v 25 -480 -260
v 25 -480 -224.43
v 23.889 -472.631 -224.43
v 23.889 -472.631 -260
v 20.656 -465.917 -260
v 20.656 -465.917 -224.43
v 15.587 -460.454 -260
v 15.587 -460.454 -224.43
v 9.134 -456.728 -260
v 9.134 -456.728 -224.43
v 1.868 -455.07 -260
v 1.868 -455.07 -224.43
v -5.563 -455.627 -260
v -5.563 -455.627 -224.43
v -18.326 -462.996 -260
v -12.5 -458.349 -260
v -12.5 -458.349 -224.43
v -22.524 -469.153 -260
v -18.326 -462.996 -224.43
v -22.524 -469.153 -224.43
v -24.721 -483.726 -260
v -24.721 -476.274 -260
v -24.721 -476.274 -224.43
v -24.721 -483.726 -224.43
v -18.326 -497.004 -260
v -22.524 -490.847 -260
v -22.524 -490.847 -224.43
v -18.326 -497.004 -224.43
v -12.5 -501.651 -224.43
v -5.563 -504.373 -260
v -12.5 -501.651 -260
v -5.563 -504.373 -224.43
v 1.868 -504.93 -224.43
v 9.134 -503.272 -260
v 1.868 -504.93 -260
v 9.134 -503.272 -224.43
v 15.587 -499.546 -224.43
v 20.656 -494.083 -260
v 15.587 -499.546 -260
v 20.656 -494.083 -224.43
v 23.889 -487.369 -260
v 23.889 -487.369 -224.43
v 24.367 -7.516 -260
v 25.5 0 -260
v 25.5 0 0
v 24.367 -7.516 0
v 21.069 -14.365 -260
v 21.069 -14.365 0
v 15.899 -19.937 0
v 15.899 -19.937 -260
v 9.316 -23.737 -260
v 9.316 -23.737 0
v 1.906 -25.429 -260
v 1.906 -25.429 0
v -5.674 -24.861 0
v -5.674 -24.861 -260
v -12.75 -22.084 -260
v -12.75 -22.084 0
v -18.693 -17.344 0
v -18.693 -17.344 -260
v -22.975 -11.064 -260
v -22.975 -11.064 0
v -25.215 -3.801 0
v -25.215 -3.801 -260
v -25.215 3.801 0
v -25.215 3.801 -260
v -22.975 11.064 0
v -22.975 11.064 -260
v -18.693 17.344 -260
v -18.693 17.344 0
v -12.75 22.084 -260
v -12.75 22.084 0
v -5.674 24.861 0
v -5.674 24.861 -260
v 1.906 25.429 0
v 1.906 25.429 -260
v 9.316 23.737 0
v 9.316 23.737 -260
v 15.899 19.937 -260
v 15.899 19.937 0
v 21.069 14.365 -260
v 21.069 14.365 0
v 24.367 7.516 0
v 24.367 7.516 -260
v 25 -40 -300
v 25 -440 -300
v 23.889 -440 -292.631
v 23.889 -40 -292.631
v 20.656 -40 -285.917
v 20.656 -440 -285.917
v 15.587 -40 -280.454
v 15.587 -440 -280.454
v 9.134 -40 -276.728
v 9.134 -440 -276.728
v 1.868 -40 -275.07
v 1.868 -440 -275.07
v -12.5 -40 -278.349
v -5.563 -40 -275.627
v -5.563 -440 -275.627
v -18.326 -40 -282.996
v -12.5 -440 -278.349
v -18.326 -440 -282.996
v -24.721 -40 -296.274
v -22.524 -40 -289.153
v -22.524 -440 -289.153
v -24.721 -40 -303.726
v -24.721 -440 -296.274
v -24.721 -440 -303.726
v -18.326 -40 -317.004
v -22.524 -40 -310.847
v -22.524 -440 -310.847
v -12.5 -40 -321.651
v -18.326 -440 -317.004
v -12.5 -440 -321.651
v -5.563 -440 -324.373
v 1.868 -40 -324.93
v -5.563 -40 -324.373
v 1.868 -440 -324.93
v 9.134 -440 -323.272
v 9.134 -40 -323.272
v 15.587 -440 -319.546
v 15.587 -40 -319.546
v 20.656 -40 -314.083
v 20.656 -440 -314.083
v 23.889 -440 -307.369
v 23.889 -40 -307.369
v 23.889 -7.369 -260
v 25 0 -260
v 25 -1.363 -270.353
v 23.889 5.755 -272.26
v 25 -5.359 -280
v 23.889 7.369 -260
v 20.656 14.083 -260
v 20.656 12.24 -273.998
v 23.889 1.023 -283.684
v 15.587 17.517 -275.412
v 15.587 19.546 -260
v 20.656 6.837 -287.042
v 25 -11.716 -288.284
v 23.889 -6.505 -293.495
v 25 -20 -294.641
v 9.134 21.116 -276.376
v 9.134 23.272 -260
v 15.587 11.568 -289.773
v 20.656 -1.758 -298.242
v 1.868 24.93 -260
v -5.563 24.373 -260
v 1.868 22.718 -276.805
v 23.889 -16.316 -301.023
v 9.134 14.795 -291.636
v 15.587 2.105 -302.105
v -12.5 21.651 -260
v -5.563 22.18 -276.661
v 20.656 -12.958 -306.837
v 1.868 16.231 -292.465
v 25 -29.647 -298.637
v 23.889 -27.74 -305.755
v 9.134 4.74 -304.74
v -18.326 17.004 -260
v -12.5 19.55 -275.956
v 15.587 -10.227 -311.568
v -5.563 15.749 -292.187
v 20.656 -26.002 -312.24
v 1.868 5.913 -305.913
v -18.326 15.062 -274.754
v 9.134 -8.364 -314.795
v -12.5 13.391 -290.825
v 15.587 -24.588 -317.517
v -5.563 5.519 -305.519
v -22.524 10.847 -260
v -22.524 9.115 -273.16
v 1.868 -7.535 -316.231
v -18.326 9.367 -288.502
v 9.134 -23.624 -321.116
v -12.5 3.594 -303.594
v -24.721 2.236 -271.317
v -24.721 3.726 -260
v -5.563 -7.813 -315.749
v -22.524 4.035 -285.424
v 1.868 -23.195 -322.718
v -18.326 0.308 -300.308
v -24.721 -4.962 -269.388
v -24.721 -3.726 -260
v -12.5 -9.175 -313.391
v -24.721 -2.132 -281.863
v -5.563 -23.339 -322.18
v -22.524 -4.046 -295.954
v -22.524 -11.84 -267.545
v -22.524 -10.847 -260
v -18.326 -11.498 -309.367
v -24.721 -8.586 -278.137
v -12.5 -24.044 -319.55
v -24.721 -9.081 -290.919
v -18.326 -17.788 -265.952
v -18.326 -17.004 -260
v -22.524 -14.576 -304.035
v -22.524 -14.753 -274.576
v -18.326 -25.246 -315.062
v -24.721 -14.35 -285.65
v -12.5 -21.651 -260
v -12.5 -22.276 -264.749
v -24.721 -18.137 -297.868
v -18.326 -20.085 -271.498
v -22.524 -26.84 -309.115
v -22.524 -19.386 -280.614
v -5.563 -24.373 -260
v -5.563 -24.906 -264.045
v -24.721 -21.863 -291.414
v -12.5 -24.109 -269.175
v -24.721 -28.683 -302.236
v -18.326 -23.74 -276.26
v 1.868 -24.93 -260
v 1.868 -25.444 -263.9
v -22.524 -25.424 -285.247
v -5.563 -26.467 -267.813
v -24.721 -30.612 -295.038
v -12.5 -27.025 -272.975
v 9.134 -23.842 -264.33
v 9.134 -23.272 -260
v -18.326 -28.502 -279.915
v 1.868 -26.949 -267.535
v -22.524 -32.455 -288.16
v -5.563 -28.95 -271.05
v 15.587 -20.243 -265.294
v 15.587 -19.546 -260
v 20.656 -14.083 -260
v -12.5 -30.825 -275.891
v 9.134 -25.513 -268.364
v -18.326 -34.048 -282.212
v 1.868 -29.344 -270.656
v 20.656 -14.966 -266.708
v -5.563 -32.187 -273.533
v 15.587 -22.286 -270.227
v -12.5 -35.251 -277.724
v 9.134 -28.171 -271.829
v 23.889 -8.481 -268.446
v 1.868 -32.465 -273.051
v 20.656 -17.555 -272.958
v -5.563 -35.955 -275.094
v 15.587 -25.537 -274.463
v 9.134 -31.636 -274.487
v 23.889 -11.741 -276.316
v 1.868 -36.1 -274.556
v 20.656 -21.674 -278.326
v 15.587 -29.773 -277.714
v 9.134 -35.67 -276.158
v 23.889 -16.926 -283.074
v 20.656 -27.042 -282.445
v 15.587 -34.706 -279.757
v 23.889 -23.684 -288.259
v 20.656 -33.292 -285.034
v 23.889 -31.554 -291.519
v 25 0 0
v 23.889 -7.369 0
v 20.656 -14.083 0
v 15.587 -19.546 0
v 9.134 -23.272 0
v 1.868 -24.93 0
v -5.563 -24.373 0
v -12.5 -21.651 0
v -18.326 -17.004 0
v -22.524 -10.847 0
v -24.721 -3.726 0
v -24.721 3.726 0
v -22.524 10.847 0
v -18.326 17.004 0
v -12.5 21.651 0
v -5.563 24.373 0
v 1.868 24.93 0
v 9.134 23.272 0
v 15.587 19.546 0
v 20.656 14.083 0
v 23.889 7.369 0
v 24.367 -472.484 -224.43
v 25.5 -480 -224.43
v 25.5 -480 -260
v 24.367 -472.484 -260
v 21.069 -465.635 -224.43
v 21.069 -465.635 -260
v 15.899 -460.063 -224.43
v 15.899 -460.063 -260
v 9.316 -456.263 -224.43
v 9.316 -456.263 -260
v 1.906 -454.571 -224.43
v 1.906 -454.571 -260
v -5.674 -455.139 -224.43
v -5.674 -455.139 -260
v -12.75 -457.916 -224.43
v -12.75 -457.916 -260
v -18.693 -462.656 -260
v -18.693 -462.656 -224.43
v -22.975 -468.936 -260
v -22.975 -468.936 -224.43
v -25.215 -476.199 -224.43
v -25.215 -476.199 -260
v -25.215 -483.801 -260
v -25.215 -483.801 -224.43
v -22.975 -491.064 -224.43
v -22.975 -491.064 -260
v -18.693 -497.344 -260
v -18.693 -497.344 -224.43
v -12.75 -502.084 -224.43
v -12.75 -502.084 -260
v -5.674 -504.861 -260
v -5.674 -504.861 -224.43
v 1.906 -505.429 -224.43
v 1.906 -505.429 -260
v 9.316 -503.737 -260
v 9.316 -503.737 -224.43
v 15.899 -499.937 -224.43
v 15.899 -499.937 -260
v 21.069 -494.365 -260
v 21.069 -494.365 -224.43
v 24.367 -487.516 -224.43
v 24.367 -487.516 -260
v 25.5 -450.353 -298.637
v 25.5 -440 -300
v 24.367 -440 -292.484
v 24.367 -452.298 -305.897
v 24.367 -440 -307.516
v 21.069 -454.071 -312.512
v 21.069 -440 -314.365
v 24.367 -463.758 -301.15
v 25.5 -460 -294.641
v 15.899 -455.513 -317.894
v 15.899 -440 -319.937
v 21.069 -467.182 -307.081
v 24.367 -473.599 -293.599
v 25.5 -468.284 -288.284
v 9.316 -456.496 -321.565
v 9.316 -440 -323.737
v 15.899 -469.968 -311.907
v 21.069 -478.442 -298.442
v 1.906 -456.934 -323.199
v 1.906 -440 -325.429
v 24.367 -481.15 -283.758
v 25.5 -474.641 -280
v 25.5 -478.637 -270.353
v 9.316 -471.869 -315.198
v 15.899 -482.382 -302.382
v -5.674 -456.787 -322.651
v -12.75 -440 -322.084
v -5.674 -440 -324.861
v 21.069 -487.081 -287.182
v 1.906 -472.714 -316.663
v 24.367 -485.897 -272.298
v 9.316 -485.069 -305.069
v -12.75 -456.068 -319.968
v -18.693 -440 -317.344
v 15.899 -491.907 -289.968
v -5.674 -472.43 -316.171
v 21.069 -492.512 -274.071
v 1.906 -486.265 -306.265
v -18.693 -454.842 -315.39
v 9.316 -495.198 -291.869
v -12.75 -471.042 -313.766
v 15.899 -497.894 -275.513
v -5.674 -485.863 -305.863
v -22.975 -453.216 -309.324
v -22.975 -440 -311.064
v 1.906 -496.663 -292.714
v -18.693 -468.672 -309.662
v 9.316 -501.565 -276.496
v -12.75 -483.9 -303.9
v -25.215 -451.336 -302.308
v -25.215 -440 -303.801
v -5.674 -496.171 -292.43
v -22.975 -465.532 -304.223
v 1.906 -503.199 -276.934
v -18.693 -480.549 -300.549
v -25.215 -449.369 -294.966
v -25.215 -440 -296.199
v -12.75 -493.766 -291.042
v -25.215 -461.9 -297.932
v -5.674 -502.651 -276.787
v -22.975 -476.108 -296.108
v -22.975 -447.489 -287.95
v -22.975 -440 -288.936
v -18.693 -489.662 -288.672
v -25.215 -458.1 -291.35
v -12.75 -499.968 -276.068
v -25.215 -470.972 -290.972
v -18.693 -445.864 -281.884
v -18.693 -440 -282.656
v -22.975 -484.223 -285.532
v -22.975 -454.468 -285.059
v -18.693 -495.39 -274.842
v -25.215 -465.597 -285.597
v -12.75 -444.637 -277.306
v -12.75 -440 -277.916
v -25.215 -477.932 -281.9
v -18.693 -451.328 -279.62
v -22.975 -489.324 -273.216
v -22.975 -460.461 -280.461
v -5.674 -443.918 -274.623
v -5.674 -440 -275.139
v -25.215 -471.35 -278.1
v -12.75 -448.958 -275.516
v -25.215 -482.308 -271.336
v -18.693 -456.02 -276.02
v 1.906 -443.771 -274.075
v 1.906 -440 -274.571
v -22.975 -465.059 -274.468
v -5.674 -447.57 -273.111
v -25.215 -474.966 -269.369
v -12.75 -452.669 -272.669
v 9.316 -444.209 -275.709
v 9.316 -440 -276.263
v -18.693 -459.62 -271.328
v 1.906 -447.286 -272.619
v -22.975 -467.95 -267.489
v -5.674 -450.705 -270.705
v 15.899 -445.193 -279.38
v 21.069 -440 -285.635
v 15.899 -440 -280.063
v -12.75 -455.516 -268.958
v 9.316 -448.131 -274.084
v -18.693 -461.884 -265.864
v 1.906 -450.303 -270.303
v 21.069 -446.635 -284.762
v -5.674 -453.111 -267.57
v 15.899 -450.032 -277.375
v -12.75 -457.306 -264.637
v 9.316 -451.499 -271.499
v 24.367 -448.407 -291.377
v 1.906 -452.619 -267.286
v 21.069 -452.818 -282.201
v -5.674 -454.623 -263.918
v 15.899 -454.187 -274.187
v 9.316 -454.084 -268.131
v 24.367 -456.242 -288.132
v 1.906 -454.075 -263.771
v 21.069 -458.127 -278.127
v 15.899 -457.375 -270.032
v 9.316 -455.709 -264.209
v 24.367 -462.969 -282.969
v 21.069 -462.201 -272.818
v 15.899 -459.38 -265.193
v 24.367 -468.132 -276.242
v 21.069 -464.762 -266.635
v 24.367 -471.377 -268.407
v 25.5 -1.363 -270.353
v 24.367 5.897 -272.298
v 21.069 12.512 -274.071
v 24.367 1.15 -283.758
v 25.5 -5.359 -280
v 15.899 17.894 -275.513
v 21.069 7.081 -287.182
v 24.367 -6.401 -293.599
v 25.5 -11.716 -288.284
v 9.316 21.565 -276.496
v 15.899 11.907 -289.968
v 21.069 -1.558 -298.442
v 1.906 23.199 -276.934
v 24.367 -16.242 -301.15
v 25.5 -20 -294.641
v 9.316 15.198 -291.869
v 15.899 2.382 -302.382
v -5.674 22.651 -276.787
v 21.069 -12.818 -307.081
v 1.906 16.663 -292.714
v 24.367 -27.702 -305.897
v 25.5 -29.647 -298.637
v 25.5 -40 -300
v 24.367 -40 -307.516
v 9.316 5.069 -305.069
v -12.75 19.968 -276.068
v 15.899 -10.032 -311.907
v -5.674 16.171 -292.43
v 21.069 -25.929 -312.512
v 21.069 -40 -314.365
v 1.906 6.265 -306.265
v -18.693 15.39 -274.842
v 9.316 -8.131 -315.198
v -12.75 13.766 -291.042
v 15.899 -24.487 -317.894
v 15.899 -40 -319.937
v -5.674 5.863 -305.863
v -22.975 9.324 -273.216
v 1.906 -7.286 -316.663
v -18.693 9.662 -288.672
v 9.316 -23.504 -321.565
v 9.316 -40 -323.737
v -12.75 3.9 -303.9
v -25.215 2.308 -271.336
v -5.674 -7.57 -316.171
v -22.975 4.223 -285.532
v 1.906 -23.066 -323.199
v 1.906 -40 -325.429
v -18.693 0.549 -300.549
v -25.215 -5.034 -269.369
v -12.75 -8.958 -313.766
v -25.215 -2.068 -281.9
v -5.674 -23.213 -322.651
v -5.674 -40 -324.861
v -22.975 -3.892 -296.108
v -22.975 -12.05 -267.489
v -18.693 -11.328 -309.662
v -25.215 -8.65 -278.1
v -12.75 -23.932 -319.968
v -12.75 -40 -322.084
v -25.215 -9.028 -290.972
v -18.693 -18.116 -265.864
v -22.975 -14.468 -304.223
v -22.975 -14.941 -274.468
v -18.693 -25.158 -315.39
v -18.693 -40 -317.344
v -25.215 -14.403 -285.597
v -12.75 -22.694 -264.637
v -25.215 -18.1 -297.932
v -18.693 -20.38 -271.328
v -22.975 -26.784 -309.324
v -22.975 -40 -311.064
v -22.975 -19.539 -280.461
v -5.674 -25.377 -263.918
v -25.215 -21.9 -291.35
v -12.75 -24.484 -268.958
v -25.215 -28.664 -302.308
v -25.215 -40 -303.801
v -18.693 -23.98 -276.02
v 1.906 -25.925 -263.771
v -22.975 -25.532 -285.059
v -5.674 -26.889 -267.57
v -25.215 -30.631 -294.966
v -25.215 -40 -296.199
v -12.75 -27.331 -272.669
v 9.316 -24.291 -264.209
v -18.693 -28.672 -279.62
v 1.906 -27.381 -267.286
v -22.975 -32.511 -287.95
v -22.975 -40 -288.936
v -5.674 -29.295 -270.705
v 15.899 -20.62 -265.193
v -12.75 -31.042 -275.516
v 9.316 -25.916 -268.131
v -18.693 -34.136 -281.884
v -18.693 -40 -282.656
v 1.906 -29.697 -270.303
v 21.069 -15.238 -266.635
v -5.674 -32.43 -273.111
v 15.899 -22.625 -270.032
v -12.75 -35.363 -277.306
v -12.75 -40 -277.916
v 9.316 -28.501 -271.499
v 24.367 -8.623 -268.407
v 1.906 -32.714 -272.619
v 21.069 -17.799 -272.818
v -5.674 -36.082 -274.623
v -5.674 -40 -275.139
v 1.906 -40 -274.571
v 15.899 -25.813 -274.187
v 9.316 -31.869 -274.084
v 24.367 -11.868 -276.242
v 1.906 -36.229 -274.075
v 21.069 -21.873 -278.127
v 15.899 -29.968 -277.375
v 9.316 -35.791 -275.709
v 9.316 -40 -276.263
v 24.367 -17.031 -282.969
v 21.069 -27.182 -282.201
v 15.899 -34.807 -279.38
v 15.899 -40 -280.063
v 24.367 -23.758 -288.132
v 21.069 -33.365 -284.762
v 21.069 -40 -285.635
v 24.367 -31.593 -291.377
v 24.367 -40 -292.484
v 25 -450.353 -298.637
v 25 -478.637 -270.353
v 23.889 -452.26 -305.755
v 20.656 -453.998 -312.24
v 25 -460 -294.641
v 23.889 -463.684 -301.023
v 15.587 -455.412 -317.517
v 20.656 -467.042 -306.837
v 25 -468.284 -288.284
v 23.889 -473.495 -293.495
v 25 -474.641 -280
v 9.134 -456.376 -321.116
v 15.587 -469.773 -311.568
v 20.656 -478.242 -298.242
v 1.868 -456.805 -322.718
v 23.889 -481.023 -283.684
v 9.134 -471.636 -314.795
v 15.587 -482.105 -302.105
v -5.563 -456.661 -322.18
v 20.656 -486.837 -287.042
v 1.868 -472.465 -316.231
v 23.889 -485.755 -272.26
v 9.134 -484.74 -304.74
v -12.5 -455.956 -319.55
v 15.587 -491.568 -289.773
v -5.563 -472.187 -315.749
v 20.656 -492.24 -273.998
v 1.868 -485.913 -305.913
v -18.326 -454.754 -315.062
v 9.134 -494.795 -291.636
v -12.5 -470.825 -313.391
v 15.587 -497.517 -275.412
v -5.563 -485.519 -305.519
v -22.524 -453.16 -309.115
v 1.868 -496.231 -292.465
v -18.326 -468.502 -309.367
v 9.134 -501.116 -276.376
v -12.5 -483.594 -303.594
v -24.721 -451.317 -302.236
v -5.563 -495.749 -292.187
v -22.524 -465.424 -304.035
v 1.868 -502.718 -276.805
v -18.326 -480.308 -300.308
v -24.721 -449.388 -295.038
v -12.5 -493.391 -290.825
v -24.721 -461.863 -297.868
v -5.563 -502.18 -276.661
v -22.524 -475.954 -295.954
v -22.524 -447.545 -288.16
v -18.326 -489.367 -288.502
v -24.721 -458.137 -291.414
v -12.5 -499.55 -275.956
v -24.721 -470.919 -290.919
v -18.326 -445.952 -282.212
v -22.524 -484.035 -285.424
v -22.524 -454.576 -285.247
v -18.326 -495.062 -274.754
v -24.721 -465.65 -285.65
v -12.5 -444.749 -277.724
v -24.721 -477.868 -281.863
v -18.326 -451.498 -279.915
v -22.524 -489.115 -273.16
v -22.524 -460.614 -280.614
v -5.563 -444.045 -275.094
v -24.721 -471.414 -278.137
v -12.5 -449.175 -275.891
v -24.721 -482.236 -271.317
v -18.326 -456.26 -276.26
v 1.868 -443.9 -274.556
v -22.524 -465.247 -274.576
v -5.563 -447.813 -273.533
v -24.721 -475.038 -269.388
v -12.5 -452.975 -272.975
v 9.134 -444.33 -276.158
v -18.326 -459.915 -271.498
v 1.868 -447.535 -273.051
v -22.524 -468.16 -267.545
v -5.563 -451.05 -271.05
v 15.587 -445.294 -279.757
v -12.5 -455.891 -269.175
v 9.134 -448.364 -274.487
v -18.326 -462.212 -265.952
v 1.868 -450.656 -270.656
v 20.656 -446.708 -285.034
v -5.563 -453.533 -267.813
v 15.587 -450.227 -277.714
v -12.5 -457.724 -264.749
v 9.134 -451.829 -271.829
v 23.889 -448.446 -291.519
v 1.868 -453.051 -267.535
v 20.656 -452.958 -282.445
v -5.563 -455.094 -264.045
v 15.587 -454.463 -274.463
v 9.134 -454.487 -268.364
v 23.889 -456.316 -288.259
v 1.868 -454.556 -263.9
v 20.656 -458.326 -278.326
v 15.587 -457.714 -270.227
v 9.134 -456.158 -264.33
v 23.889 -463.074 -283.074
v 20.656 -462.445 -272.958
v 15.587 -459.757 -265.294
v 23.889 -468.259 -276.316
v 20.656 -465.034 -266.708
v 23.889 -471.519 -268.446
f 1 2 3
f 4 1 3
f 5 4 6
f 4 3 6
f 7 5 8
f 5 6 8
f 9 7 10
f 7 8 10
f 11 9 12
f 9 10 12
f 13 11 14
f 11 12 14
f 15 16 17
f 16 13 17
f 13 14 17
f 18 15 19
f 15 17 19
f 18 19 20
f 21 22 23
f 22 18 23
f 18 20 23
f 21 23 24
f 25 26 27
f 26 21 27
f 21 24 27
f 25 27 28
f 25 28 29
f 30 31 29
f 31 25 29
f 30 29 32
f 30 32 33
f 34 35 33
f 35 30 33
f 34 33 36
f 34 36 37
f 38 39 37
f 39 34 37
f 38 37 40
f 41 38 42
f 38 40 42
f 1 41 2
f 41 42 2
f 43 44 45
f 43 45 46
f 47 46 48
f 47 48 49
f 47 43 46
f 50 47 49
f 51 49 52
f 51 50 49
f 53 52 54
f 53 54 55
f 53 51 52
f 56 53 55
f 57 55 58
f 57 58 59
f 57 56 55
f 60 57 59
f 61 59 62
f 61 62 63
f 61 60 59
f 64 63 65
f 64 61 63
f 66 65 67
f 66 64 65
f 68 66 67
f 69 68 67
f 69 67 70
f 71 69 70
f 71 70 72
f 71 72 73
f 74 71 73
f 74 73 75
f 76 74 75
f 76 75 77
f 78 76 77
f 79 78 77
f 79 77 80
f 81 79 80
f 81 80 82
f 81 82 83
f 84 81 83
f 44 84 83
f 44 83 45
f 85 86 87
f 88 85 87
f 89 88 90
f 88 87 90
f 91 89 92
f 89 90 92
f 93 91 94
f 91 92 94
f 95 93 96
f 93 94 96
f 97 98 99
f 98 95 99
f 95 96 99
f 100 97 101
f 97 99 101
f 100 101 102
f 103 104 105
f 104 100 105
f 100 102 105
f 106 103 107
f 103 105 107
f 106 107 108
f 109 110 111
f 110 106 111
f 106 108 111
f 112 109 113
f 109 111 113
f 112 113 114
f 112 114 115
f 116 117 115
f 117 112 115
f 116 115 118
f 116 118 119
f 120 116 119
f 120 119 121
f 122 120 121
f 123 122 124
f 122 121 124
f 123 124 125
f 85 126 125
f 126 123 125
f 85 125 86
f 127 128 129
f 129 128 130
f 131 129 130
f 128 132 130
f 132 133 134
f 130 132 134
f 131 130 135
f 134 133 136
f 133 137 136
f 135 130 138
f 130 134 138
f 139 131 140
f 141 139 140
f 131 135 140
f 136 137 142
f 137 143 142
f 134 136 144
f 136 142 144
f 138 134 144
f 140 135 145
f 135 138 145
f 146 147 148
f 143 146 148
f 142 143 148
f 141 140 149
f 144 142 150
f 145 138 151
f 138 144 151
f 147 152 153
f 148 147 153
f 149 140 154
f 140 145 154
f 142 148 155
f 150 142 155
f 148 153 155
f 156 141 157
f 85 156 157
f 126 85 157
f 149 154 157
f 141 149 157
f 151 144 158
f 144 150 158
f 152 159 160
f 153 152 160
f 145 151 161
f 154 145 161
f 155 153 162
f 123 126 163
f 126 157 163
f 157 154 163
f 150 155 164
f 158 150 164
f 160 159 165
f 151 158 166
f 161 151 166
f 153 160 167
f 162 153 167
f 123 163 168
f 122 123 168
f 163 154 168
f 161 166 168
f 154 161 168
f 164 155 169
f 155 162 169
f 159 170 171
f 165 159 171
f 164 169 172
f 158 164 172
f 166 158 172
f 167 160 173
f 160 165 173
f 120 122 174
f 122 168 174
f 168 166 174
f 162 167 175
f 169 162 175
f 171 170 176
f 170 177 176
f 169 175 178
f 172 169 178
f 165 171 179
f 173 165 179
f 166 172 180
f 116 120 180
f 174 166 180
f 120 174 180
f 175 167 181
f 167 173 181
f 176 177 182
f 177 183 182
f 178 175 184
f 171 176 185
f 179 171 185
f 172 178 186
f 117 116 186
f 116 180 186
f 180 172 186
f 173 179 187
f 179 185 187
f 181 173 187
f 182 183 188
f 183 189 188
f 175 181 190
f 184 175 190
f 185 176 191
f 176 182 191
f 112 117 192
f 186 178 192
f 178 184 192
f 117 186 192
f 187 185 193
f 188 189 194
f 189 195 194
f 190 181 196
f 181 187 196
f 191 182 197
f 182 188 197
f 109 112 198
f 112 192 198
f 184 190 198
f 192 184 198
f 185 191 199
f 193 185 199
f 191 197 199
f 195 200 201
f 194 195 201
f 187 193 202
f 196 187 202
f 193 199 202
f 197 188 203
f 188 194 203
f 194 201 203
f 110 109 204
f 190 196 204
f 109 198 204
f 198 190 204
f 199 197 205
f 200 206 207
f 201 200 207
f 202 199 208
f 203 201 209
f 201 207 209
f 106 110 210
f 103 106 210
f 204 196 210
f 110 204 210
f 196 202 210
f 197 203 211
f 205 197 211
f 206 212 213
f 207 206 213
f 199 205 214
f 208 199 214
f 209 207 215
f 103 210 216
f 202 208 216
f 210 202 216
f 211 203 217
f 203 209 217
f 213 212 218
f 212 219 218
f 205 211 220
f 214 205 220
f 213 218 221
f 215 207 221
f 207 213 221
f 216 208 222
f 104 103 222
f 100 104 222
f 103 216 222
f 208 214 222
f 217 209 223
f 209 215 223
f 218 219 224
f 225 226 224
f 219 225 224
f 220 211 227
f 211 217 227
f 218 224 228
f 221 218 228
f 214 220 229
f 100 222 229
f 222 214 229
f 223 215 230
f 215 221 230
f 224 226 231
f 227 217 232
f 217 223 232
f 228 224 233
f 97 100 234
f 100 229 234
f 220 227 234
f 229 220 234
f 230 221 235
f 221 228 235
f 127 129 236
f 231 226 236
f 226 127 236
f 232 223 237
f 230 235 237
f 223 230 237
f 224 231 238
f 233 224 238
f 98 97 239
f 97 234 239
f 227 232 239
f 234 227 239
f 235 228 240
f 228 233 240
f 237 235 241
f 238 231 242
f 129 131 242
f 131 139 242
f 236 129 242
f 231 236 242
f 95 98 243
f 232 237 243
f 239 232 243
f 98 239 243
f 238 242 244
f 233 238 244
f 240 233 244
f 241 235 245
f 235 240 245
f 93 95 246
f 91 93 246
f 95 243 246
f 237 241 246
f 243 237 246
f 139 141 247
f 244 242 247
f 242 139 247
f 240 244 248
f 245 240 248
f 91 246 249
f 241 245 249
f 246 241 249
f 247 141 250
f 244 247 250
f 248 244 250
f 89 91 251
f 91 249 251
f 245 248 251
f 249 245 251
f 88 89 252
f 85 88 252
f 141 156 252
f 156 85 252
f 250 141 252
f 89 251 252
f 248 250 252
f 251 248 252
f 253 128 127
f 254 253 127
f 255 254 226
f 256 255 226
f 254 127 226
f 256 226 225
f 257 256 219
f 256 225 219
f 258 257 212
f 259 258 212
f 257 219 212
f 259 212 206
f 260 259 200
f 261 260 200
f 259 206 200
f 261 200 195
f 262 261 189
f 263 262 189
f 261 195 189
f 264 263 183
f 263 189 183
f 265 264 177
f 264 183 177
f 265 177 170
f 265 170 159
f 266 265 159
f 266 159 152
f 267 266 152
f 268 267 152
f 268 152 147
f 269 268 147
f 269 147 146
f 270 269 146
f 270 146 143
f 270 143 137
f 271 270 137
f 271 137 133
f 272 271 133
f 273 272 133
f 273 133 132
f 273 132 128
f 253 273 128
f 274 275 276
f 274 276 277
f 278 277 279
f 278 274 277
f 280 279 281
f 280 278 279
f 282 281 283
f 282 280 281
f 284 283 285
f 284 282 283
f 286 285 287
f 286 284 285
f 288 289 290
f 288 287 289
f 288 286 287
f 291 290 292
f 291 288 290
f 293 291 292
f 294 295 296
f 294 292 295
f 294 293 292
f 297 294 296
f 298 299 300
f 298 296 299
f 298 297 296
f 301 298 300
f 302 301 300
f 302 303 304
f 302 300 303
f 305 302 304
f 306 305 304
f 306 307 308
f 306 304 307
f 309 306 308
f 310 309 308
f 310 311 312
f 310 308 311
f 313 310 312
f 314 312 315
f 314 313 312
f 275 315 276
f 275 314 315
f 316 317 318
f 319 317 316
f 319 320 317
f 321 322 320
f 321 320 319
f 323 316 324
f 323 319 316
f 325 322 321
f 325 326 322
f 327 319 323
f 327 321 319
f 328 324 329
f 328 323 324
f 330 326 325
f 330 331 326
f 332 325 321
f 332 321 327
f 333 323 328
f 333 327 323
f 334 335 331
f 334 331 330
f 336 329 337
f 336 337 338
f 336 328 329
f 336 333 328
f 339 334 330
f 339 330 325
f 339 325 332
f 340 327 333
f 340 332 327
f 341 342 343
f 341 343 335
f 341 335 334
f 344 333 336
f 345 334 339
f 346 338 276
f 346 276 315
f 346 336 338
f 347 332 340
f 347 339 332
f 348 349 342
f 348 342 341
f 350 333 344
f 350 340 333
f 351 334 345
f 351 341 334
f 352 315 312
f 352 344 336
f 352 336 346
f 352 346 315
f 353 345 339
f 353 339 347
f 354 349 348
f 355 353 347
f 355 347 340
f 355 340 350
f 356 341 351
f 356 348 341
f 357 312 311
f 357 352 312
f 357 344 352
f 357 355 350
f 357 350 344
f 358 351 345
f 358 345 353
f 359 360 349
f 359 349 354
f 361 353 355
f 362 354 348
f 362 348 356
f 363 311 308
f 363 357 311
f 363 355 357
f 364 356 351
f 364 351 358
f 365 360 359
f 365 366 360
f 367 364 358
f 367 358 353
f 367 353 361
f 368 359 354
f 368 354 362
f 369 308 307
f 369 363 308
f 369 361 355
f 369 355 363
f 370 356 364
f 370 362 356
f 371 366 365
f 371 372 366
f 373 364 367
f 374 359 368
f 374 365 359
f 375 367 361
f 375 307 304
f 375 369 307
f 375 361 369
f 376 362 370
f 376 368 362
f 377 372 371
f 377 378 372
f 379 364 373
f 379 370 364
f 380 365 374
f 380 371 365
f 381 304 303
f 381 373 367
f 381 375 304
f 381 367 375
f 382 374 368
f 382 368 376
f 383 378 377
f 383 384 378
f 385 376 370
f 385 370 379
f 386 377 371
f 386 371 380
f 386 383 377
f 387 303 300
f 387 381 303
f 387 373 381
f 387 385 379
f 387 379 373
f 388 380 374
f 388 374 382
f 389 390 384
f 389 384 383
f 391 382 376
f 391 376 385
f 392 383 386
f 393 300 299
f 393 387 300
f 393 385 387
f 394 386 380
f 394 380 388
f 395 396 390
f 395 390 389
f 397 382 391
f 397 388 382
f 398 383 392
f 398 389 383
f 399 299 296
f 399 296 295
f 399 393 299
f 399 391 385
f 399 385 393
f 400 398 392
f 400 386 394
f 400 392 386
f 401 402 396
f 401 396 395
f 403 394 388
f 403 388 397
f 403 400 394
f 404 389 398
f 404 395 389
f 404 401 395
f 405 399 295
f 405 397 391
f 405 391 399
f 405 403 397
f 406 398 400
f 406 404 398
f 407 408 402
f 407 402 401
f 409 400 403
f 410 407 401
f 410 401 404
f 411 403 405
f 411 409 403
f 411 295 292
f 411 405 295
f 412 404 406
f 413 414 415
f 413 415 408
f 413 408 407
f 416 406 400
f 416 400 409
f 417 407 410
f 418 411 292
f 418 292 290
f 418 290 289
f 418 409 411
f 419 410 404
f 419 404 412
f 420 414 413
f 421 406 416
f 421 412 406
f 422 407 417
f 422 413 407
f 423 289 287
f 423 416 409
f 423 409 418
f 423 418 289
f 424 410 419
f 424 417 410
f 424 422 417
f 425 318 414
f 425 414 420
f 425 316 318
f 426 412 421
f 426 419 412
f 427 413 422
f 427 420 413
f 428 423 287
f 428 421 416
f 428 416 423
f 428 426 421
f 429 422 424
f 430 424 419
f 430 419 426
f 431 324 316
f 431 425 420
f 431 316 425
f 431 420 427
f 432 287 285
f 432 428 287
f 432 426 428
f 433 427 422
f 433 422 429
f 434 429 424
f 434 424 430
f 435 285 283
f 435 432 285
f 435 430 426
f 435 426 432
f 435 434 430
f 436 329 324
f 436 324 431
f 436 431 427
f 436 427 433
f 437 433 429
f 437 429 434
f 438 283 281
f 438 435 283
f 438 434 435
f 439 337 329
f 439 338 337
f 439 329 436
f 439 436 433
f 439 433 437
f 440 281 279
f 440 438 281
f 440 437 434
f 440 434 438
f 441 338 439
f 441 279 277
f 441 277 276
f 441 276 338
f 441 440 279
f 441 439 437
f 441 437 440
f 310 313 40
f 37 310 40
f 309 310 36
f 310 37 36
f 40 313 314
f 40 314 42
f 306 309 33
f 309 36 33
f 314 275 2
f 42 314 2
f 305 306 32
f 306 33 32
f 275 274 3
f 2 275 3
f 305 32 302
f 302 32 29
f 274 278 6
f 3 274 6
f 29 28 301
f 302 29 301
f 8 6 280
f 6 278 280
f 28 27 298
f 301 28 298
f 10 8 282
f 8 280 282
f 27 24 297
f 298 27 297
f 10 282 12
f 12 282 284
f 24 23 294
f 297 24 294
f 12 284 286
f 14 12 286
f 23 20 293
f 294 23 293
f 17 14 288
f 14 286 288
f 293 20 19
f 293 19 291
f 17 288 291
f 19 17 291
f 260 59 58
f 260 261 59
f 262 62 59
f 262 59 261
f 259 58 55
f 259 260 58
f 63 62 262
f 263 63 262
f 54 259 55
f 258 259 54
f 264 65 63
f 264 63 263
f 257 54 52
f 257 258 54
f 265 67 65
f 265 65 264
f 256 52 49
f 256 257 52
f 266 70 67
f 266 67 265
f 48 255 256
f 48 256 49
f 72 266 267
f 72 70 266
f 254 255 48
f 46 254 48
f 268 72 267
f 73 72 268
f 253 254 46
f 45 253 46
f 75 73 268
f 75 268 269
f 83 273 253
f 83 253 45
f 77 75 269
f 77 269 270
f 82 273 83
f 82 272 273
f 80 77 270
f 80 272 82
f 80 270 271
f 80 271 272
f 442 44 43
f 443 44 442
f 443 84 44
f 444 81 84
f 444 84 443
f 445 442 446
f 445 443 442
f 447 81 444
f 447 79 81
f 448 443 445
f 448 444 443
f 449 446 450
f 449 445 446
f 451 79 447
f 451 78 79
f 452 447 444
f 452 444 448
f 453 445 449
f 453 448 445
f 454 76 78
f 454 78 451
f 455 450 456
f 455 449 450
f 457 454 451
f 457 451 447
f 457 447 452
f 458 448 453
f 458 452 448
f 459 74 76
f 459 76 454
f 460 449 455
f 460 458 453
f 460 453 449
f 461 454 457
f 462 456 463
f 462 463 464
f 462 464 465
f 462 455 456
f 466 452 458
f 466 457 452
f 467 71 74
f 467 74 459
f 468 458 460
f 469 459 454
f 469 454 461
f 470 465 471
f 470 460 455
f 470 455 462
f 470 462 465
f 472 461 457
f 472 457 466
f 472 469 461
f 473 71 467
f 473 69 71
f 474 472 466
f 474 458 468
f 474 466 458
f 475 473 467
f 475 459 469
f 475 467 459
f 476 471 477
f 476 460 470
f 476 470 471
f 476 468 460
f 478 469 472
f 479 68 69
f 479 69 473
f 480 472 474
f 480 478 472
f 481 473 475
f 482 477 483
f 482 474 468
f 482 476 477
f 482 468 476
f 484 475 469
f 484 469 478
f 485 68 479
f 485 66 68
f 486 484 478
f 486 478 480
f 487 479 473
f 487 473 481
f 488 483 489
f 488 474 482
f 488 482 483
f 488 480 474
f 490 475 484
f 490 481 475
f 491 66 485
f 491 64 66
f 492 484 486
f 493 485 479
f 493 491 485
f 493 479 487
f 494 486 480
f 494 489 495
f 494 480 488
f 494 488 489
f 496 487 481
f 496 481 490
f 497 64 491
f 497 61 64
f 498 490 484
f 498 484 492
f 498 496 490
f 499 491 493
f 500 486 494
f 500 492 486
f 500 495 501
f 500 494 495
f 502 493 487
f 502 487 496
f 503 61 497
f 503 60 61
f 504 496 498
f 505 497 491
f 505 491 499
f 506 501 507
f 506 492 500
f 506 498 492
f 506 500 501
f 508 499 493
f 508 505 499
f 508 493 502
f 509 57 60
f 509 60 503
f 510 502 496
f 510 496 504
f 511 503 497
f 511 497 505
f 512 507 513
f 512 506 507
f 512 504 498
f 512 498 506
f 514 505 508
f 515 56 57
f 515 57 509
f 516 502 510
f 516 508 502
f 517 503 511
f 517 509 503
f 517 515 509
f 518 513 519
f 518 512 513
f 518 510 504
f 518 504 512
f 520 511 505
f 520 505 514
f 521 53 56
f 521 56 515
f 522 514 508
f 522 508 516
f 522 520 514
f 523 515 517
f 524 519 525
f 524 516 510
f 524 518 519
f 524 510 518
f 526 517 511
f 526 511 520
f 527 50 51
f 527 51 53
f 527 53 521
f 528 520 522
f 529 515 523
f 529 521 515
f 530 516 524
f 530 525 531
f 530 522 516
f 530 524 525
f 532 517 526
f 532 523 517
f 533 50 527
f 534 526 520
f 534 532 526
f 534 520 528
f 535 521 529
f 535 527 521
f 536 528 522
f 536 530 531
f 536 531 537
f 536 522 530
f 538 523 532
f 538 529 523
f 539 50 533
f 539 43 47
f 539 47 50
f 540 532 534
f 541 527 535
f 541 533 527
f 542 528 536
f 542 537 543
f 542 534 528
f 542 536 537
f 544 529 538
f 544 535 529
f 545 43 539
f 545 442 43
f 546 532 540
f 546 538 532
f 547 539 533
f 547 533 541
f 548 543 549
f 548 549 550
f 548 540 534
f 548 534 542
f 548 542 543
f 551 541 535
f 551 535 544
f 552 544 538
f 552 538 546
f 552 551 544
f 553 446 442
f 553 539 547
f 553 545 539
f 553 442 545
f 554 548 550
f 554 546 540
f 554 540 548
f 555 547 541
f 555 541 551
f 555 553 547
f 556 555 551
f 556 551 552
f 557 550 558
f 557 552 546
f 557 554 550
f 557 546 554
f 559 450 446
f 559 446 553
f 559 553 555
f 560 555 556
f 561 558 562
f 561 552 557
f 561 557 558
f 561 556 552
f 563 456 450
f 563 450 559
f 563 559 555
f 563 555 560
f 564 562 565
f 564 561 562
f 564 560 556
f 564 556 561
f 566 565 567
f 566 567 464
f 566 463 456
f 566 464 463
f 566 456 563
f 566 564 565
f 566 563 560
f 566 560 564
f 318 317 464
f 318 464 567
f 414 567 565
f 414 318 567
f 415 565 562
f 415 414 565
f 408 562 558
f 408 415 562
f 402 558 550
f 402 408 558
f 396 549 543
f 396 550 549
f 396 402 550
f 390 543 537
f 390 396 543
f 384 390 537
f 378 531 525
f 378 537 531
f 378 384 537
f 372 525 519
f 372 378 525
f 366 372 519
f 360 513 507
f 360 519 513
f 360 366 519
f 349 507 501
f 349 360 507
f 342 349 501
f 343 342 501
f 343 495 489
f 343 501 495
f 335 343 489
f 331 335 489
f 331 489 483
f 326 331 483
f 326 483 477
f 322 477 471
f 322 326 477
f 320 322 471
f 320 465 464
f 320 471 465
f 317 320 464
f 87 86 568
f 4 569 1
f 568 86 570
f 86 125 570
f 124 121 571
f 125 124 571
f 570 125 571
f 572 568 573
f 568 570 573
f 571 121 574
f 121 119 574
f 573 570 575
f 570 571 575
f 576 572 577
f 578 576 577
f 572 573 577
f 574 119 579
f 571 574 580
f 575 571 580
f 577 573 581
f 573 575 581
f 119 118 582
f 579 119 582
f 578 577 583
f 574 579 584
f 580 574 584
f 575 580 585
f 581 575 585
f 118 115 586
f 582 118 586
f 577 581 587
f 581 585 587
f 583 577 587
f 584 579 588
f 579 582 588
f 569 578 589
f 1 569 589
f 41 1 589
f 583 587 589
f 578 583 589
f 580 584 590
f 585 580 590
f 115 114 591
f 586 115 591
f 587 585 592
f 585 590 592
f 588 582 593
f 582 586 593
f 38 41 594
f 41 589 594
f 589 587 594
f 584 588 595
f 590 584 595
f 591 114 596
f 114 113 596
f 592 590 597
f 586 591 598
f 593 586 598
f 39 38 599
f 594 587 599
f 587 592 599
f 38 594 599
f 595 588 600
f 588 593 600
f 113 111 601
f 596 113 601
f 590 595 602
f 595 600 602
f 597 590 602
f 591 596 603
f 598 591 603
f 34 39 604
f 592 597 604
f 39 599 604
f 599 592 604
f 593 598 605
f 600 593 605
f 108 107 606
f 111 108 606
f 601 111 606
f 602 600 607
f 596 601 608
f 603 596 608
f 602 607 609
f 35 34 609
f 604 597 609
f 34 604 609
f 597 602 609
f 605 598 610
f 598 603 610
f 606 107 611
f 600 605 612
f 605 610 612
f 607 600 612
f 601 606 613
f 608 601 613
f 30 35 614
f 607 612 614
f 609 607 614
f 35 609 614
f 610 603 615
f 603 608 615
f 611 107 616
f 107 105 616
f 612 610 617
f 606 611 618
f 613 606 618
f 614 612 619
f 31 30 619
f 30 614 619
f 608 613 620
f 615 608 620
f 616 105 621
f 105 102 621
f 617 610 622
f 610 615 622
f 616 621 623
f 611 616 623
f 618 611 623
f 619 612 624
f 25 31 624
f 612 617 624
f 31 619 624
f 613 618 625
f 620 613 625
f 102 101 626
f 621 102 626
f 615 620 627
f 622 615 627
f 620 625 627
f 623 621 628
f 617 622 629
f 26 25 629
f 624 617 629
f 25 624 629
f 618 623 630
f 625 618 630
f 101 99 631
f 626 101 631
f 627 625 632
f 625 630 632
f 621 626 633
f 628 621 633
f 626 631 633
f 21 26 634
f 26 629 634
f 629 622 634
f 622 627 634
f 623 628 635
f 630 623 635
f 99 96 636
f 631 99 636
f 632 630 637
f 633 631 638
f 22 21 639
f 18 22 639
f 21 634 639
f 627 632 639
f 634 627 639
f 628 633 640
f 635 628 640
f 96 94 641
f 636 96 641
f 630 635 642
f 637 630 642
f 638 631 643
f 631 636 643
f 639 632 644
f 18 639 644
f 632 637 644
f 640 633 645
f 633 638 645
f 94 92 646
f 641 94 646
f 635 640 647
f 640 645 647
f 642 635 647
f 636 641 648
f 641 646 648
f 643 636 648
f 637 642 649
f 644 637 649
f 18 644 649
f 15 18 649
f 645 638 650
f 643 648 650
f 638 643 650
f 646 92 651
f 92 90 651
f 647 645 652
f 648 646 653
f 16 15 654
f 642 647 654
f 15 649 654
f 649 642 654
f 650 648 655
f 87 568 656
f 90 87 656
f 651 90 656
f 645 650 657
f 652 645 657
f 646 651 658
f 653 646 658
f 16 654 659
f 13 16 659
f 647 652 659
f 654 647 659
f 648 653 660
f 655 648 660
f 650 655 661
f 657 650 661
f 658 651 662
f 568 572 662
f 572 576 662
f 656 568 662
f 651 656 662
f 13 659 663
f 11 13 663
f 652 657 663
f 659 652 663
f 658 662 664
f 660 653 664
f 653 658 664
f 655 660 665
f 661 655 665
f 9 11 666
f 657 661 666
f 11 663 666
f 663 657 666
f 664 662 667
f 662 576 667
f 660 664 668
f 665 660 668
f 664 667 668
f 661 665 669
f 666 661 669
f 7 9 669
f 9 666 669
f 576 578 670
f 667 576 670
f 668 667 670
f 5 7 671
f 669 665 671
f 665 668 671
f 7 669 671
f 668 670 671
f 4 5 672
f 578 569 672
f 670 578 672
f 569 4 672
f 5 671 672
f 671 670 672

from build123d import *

# Parameters (mm, degrees)
SKETCH31_R   = 25.5
SKETCH31_R_2 = 25


with BuildPart() as part:
    # Sweep1: sweep along a path in Sketch3
    with BuildLine(Plane(origin=(0, 0, 0), x_dir=(0, 0, -1), z_dir=(1, 0, 0))) as sweep1_path:
        Line((0, 0), (260, 0))
        ThreePointArc((260, 0), (288.284271247, -11.715728753), (300, -40))
        Line((300, -40), (300, -440))
        ThreePointArc((300, -440), (288.284271247, -468.284271247), (260, -480))
        Line((260, -480), (224.43, -480))
    # Sketch31 → Sweep1 (sweep)
    with BuildSketch(Plane.XY):
        Circle(SKETCH31_R)
        Circle(SKETCH31_R_2, mode=Mode.SUBTRACT)
    sweep(path=sweep1_path.line)


solid = part.part
